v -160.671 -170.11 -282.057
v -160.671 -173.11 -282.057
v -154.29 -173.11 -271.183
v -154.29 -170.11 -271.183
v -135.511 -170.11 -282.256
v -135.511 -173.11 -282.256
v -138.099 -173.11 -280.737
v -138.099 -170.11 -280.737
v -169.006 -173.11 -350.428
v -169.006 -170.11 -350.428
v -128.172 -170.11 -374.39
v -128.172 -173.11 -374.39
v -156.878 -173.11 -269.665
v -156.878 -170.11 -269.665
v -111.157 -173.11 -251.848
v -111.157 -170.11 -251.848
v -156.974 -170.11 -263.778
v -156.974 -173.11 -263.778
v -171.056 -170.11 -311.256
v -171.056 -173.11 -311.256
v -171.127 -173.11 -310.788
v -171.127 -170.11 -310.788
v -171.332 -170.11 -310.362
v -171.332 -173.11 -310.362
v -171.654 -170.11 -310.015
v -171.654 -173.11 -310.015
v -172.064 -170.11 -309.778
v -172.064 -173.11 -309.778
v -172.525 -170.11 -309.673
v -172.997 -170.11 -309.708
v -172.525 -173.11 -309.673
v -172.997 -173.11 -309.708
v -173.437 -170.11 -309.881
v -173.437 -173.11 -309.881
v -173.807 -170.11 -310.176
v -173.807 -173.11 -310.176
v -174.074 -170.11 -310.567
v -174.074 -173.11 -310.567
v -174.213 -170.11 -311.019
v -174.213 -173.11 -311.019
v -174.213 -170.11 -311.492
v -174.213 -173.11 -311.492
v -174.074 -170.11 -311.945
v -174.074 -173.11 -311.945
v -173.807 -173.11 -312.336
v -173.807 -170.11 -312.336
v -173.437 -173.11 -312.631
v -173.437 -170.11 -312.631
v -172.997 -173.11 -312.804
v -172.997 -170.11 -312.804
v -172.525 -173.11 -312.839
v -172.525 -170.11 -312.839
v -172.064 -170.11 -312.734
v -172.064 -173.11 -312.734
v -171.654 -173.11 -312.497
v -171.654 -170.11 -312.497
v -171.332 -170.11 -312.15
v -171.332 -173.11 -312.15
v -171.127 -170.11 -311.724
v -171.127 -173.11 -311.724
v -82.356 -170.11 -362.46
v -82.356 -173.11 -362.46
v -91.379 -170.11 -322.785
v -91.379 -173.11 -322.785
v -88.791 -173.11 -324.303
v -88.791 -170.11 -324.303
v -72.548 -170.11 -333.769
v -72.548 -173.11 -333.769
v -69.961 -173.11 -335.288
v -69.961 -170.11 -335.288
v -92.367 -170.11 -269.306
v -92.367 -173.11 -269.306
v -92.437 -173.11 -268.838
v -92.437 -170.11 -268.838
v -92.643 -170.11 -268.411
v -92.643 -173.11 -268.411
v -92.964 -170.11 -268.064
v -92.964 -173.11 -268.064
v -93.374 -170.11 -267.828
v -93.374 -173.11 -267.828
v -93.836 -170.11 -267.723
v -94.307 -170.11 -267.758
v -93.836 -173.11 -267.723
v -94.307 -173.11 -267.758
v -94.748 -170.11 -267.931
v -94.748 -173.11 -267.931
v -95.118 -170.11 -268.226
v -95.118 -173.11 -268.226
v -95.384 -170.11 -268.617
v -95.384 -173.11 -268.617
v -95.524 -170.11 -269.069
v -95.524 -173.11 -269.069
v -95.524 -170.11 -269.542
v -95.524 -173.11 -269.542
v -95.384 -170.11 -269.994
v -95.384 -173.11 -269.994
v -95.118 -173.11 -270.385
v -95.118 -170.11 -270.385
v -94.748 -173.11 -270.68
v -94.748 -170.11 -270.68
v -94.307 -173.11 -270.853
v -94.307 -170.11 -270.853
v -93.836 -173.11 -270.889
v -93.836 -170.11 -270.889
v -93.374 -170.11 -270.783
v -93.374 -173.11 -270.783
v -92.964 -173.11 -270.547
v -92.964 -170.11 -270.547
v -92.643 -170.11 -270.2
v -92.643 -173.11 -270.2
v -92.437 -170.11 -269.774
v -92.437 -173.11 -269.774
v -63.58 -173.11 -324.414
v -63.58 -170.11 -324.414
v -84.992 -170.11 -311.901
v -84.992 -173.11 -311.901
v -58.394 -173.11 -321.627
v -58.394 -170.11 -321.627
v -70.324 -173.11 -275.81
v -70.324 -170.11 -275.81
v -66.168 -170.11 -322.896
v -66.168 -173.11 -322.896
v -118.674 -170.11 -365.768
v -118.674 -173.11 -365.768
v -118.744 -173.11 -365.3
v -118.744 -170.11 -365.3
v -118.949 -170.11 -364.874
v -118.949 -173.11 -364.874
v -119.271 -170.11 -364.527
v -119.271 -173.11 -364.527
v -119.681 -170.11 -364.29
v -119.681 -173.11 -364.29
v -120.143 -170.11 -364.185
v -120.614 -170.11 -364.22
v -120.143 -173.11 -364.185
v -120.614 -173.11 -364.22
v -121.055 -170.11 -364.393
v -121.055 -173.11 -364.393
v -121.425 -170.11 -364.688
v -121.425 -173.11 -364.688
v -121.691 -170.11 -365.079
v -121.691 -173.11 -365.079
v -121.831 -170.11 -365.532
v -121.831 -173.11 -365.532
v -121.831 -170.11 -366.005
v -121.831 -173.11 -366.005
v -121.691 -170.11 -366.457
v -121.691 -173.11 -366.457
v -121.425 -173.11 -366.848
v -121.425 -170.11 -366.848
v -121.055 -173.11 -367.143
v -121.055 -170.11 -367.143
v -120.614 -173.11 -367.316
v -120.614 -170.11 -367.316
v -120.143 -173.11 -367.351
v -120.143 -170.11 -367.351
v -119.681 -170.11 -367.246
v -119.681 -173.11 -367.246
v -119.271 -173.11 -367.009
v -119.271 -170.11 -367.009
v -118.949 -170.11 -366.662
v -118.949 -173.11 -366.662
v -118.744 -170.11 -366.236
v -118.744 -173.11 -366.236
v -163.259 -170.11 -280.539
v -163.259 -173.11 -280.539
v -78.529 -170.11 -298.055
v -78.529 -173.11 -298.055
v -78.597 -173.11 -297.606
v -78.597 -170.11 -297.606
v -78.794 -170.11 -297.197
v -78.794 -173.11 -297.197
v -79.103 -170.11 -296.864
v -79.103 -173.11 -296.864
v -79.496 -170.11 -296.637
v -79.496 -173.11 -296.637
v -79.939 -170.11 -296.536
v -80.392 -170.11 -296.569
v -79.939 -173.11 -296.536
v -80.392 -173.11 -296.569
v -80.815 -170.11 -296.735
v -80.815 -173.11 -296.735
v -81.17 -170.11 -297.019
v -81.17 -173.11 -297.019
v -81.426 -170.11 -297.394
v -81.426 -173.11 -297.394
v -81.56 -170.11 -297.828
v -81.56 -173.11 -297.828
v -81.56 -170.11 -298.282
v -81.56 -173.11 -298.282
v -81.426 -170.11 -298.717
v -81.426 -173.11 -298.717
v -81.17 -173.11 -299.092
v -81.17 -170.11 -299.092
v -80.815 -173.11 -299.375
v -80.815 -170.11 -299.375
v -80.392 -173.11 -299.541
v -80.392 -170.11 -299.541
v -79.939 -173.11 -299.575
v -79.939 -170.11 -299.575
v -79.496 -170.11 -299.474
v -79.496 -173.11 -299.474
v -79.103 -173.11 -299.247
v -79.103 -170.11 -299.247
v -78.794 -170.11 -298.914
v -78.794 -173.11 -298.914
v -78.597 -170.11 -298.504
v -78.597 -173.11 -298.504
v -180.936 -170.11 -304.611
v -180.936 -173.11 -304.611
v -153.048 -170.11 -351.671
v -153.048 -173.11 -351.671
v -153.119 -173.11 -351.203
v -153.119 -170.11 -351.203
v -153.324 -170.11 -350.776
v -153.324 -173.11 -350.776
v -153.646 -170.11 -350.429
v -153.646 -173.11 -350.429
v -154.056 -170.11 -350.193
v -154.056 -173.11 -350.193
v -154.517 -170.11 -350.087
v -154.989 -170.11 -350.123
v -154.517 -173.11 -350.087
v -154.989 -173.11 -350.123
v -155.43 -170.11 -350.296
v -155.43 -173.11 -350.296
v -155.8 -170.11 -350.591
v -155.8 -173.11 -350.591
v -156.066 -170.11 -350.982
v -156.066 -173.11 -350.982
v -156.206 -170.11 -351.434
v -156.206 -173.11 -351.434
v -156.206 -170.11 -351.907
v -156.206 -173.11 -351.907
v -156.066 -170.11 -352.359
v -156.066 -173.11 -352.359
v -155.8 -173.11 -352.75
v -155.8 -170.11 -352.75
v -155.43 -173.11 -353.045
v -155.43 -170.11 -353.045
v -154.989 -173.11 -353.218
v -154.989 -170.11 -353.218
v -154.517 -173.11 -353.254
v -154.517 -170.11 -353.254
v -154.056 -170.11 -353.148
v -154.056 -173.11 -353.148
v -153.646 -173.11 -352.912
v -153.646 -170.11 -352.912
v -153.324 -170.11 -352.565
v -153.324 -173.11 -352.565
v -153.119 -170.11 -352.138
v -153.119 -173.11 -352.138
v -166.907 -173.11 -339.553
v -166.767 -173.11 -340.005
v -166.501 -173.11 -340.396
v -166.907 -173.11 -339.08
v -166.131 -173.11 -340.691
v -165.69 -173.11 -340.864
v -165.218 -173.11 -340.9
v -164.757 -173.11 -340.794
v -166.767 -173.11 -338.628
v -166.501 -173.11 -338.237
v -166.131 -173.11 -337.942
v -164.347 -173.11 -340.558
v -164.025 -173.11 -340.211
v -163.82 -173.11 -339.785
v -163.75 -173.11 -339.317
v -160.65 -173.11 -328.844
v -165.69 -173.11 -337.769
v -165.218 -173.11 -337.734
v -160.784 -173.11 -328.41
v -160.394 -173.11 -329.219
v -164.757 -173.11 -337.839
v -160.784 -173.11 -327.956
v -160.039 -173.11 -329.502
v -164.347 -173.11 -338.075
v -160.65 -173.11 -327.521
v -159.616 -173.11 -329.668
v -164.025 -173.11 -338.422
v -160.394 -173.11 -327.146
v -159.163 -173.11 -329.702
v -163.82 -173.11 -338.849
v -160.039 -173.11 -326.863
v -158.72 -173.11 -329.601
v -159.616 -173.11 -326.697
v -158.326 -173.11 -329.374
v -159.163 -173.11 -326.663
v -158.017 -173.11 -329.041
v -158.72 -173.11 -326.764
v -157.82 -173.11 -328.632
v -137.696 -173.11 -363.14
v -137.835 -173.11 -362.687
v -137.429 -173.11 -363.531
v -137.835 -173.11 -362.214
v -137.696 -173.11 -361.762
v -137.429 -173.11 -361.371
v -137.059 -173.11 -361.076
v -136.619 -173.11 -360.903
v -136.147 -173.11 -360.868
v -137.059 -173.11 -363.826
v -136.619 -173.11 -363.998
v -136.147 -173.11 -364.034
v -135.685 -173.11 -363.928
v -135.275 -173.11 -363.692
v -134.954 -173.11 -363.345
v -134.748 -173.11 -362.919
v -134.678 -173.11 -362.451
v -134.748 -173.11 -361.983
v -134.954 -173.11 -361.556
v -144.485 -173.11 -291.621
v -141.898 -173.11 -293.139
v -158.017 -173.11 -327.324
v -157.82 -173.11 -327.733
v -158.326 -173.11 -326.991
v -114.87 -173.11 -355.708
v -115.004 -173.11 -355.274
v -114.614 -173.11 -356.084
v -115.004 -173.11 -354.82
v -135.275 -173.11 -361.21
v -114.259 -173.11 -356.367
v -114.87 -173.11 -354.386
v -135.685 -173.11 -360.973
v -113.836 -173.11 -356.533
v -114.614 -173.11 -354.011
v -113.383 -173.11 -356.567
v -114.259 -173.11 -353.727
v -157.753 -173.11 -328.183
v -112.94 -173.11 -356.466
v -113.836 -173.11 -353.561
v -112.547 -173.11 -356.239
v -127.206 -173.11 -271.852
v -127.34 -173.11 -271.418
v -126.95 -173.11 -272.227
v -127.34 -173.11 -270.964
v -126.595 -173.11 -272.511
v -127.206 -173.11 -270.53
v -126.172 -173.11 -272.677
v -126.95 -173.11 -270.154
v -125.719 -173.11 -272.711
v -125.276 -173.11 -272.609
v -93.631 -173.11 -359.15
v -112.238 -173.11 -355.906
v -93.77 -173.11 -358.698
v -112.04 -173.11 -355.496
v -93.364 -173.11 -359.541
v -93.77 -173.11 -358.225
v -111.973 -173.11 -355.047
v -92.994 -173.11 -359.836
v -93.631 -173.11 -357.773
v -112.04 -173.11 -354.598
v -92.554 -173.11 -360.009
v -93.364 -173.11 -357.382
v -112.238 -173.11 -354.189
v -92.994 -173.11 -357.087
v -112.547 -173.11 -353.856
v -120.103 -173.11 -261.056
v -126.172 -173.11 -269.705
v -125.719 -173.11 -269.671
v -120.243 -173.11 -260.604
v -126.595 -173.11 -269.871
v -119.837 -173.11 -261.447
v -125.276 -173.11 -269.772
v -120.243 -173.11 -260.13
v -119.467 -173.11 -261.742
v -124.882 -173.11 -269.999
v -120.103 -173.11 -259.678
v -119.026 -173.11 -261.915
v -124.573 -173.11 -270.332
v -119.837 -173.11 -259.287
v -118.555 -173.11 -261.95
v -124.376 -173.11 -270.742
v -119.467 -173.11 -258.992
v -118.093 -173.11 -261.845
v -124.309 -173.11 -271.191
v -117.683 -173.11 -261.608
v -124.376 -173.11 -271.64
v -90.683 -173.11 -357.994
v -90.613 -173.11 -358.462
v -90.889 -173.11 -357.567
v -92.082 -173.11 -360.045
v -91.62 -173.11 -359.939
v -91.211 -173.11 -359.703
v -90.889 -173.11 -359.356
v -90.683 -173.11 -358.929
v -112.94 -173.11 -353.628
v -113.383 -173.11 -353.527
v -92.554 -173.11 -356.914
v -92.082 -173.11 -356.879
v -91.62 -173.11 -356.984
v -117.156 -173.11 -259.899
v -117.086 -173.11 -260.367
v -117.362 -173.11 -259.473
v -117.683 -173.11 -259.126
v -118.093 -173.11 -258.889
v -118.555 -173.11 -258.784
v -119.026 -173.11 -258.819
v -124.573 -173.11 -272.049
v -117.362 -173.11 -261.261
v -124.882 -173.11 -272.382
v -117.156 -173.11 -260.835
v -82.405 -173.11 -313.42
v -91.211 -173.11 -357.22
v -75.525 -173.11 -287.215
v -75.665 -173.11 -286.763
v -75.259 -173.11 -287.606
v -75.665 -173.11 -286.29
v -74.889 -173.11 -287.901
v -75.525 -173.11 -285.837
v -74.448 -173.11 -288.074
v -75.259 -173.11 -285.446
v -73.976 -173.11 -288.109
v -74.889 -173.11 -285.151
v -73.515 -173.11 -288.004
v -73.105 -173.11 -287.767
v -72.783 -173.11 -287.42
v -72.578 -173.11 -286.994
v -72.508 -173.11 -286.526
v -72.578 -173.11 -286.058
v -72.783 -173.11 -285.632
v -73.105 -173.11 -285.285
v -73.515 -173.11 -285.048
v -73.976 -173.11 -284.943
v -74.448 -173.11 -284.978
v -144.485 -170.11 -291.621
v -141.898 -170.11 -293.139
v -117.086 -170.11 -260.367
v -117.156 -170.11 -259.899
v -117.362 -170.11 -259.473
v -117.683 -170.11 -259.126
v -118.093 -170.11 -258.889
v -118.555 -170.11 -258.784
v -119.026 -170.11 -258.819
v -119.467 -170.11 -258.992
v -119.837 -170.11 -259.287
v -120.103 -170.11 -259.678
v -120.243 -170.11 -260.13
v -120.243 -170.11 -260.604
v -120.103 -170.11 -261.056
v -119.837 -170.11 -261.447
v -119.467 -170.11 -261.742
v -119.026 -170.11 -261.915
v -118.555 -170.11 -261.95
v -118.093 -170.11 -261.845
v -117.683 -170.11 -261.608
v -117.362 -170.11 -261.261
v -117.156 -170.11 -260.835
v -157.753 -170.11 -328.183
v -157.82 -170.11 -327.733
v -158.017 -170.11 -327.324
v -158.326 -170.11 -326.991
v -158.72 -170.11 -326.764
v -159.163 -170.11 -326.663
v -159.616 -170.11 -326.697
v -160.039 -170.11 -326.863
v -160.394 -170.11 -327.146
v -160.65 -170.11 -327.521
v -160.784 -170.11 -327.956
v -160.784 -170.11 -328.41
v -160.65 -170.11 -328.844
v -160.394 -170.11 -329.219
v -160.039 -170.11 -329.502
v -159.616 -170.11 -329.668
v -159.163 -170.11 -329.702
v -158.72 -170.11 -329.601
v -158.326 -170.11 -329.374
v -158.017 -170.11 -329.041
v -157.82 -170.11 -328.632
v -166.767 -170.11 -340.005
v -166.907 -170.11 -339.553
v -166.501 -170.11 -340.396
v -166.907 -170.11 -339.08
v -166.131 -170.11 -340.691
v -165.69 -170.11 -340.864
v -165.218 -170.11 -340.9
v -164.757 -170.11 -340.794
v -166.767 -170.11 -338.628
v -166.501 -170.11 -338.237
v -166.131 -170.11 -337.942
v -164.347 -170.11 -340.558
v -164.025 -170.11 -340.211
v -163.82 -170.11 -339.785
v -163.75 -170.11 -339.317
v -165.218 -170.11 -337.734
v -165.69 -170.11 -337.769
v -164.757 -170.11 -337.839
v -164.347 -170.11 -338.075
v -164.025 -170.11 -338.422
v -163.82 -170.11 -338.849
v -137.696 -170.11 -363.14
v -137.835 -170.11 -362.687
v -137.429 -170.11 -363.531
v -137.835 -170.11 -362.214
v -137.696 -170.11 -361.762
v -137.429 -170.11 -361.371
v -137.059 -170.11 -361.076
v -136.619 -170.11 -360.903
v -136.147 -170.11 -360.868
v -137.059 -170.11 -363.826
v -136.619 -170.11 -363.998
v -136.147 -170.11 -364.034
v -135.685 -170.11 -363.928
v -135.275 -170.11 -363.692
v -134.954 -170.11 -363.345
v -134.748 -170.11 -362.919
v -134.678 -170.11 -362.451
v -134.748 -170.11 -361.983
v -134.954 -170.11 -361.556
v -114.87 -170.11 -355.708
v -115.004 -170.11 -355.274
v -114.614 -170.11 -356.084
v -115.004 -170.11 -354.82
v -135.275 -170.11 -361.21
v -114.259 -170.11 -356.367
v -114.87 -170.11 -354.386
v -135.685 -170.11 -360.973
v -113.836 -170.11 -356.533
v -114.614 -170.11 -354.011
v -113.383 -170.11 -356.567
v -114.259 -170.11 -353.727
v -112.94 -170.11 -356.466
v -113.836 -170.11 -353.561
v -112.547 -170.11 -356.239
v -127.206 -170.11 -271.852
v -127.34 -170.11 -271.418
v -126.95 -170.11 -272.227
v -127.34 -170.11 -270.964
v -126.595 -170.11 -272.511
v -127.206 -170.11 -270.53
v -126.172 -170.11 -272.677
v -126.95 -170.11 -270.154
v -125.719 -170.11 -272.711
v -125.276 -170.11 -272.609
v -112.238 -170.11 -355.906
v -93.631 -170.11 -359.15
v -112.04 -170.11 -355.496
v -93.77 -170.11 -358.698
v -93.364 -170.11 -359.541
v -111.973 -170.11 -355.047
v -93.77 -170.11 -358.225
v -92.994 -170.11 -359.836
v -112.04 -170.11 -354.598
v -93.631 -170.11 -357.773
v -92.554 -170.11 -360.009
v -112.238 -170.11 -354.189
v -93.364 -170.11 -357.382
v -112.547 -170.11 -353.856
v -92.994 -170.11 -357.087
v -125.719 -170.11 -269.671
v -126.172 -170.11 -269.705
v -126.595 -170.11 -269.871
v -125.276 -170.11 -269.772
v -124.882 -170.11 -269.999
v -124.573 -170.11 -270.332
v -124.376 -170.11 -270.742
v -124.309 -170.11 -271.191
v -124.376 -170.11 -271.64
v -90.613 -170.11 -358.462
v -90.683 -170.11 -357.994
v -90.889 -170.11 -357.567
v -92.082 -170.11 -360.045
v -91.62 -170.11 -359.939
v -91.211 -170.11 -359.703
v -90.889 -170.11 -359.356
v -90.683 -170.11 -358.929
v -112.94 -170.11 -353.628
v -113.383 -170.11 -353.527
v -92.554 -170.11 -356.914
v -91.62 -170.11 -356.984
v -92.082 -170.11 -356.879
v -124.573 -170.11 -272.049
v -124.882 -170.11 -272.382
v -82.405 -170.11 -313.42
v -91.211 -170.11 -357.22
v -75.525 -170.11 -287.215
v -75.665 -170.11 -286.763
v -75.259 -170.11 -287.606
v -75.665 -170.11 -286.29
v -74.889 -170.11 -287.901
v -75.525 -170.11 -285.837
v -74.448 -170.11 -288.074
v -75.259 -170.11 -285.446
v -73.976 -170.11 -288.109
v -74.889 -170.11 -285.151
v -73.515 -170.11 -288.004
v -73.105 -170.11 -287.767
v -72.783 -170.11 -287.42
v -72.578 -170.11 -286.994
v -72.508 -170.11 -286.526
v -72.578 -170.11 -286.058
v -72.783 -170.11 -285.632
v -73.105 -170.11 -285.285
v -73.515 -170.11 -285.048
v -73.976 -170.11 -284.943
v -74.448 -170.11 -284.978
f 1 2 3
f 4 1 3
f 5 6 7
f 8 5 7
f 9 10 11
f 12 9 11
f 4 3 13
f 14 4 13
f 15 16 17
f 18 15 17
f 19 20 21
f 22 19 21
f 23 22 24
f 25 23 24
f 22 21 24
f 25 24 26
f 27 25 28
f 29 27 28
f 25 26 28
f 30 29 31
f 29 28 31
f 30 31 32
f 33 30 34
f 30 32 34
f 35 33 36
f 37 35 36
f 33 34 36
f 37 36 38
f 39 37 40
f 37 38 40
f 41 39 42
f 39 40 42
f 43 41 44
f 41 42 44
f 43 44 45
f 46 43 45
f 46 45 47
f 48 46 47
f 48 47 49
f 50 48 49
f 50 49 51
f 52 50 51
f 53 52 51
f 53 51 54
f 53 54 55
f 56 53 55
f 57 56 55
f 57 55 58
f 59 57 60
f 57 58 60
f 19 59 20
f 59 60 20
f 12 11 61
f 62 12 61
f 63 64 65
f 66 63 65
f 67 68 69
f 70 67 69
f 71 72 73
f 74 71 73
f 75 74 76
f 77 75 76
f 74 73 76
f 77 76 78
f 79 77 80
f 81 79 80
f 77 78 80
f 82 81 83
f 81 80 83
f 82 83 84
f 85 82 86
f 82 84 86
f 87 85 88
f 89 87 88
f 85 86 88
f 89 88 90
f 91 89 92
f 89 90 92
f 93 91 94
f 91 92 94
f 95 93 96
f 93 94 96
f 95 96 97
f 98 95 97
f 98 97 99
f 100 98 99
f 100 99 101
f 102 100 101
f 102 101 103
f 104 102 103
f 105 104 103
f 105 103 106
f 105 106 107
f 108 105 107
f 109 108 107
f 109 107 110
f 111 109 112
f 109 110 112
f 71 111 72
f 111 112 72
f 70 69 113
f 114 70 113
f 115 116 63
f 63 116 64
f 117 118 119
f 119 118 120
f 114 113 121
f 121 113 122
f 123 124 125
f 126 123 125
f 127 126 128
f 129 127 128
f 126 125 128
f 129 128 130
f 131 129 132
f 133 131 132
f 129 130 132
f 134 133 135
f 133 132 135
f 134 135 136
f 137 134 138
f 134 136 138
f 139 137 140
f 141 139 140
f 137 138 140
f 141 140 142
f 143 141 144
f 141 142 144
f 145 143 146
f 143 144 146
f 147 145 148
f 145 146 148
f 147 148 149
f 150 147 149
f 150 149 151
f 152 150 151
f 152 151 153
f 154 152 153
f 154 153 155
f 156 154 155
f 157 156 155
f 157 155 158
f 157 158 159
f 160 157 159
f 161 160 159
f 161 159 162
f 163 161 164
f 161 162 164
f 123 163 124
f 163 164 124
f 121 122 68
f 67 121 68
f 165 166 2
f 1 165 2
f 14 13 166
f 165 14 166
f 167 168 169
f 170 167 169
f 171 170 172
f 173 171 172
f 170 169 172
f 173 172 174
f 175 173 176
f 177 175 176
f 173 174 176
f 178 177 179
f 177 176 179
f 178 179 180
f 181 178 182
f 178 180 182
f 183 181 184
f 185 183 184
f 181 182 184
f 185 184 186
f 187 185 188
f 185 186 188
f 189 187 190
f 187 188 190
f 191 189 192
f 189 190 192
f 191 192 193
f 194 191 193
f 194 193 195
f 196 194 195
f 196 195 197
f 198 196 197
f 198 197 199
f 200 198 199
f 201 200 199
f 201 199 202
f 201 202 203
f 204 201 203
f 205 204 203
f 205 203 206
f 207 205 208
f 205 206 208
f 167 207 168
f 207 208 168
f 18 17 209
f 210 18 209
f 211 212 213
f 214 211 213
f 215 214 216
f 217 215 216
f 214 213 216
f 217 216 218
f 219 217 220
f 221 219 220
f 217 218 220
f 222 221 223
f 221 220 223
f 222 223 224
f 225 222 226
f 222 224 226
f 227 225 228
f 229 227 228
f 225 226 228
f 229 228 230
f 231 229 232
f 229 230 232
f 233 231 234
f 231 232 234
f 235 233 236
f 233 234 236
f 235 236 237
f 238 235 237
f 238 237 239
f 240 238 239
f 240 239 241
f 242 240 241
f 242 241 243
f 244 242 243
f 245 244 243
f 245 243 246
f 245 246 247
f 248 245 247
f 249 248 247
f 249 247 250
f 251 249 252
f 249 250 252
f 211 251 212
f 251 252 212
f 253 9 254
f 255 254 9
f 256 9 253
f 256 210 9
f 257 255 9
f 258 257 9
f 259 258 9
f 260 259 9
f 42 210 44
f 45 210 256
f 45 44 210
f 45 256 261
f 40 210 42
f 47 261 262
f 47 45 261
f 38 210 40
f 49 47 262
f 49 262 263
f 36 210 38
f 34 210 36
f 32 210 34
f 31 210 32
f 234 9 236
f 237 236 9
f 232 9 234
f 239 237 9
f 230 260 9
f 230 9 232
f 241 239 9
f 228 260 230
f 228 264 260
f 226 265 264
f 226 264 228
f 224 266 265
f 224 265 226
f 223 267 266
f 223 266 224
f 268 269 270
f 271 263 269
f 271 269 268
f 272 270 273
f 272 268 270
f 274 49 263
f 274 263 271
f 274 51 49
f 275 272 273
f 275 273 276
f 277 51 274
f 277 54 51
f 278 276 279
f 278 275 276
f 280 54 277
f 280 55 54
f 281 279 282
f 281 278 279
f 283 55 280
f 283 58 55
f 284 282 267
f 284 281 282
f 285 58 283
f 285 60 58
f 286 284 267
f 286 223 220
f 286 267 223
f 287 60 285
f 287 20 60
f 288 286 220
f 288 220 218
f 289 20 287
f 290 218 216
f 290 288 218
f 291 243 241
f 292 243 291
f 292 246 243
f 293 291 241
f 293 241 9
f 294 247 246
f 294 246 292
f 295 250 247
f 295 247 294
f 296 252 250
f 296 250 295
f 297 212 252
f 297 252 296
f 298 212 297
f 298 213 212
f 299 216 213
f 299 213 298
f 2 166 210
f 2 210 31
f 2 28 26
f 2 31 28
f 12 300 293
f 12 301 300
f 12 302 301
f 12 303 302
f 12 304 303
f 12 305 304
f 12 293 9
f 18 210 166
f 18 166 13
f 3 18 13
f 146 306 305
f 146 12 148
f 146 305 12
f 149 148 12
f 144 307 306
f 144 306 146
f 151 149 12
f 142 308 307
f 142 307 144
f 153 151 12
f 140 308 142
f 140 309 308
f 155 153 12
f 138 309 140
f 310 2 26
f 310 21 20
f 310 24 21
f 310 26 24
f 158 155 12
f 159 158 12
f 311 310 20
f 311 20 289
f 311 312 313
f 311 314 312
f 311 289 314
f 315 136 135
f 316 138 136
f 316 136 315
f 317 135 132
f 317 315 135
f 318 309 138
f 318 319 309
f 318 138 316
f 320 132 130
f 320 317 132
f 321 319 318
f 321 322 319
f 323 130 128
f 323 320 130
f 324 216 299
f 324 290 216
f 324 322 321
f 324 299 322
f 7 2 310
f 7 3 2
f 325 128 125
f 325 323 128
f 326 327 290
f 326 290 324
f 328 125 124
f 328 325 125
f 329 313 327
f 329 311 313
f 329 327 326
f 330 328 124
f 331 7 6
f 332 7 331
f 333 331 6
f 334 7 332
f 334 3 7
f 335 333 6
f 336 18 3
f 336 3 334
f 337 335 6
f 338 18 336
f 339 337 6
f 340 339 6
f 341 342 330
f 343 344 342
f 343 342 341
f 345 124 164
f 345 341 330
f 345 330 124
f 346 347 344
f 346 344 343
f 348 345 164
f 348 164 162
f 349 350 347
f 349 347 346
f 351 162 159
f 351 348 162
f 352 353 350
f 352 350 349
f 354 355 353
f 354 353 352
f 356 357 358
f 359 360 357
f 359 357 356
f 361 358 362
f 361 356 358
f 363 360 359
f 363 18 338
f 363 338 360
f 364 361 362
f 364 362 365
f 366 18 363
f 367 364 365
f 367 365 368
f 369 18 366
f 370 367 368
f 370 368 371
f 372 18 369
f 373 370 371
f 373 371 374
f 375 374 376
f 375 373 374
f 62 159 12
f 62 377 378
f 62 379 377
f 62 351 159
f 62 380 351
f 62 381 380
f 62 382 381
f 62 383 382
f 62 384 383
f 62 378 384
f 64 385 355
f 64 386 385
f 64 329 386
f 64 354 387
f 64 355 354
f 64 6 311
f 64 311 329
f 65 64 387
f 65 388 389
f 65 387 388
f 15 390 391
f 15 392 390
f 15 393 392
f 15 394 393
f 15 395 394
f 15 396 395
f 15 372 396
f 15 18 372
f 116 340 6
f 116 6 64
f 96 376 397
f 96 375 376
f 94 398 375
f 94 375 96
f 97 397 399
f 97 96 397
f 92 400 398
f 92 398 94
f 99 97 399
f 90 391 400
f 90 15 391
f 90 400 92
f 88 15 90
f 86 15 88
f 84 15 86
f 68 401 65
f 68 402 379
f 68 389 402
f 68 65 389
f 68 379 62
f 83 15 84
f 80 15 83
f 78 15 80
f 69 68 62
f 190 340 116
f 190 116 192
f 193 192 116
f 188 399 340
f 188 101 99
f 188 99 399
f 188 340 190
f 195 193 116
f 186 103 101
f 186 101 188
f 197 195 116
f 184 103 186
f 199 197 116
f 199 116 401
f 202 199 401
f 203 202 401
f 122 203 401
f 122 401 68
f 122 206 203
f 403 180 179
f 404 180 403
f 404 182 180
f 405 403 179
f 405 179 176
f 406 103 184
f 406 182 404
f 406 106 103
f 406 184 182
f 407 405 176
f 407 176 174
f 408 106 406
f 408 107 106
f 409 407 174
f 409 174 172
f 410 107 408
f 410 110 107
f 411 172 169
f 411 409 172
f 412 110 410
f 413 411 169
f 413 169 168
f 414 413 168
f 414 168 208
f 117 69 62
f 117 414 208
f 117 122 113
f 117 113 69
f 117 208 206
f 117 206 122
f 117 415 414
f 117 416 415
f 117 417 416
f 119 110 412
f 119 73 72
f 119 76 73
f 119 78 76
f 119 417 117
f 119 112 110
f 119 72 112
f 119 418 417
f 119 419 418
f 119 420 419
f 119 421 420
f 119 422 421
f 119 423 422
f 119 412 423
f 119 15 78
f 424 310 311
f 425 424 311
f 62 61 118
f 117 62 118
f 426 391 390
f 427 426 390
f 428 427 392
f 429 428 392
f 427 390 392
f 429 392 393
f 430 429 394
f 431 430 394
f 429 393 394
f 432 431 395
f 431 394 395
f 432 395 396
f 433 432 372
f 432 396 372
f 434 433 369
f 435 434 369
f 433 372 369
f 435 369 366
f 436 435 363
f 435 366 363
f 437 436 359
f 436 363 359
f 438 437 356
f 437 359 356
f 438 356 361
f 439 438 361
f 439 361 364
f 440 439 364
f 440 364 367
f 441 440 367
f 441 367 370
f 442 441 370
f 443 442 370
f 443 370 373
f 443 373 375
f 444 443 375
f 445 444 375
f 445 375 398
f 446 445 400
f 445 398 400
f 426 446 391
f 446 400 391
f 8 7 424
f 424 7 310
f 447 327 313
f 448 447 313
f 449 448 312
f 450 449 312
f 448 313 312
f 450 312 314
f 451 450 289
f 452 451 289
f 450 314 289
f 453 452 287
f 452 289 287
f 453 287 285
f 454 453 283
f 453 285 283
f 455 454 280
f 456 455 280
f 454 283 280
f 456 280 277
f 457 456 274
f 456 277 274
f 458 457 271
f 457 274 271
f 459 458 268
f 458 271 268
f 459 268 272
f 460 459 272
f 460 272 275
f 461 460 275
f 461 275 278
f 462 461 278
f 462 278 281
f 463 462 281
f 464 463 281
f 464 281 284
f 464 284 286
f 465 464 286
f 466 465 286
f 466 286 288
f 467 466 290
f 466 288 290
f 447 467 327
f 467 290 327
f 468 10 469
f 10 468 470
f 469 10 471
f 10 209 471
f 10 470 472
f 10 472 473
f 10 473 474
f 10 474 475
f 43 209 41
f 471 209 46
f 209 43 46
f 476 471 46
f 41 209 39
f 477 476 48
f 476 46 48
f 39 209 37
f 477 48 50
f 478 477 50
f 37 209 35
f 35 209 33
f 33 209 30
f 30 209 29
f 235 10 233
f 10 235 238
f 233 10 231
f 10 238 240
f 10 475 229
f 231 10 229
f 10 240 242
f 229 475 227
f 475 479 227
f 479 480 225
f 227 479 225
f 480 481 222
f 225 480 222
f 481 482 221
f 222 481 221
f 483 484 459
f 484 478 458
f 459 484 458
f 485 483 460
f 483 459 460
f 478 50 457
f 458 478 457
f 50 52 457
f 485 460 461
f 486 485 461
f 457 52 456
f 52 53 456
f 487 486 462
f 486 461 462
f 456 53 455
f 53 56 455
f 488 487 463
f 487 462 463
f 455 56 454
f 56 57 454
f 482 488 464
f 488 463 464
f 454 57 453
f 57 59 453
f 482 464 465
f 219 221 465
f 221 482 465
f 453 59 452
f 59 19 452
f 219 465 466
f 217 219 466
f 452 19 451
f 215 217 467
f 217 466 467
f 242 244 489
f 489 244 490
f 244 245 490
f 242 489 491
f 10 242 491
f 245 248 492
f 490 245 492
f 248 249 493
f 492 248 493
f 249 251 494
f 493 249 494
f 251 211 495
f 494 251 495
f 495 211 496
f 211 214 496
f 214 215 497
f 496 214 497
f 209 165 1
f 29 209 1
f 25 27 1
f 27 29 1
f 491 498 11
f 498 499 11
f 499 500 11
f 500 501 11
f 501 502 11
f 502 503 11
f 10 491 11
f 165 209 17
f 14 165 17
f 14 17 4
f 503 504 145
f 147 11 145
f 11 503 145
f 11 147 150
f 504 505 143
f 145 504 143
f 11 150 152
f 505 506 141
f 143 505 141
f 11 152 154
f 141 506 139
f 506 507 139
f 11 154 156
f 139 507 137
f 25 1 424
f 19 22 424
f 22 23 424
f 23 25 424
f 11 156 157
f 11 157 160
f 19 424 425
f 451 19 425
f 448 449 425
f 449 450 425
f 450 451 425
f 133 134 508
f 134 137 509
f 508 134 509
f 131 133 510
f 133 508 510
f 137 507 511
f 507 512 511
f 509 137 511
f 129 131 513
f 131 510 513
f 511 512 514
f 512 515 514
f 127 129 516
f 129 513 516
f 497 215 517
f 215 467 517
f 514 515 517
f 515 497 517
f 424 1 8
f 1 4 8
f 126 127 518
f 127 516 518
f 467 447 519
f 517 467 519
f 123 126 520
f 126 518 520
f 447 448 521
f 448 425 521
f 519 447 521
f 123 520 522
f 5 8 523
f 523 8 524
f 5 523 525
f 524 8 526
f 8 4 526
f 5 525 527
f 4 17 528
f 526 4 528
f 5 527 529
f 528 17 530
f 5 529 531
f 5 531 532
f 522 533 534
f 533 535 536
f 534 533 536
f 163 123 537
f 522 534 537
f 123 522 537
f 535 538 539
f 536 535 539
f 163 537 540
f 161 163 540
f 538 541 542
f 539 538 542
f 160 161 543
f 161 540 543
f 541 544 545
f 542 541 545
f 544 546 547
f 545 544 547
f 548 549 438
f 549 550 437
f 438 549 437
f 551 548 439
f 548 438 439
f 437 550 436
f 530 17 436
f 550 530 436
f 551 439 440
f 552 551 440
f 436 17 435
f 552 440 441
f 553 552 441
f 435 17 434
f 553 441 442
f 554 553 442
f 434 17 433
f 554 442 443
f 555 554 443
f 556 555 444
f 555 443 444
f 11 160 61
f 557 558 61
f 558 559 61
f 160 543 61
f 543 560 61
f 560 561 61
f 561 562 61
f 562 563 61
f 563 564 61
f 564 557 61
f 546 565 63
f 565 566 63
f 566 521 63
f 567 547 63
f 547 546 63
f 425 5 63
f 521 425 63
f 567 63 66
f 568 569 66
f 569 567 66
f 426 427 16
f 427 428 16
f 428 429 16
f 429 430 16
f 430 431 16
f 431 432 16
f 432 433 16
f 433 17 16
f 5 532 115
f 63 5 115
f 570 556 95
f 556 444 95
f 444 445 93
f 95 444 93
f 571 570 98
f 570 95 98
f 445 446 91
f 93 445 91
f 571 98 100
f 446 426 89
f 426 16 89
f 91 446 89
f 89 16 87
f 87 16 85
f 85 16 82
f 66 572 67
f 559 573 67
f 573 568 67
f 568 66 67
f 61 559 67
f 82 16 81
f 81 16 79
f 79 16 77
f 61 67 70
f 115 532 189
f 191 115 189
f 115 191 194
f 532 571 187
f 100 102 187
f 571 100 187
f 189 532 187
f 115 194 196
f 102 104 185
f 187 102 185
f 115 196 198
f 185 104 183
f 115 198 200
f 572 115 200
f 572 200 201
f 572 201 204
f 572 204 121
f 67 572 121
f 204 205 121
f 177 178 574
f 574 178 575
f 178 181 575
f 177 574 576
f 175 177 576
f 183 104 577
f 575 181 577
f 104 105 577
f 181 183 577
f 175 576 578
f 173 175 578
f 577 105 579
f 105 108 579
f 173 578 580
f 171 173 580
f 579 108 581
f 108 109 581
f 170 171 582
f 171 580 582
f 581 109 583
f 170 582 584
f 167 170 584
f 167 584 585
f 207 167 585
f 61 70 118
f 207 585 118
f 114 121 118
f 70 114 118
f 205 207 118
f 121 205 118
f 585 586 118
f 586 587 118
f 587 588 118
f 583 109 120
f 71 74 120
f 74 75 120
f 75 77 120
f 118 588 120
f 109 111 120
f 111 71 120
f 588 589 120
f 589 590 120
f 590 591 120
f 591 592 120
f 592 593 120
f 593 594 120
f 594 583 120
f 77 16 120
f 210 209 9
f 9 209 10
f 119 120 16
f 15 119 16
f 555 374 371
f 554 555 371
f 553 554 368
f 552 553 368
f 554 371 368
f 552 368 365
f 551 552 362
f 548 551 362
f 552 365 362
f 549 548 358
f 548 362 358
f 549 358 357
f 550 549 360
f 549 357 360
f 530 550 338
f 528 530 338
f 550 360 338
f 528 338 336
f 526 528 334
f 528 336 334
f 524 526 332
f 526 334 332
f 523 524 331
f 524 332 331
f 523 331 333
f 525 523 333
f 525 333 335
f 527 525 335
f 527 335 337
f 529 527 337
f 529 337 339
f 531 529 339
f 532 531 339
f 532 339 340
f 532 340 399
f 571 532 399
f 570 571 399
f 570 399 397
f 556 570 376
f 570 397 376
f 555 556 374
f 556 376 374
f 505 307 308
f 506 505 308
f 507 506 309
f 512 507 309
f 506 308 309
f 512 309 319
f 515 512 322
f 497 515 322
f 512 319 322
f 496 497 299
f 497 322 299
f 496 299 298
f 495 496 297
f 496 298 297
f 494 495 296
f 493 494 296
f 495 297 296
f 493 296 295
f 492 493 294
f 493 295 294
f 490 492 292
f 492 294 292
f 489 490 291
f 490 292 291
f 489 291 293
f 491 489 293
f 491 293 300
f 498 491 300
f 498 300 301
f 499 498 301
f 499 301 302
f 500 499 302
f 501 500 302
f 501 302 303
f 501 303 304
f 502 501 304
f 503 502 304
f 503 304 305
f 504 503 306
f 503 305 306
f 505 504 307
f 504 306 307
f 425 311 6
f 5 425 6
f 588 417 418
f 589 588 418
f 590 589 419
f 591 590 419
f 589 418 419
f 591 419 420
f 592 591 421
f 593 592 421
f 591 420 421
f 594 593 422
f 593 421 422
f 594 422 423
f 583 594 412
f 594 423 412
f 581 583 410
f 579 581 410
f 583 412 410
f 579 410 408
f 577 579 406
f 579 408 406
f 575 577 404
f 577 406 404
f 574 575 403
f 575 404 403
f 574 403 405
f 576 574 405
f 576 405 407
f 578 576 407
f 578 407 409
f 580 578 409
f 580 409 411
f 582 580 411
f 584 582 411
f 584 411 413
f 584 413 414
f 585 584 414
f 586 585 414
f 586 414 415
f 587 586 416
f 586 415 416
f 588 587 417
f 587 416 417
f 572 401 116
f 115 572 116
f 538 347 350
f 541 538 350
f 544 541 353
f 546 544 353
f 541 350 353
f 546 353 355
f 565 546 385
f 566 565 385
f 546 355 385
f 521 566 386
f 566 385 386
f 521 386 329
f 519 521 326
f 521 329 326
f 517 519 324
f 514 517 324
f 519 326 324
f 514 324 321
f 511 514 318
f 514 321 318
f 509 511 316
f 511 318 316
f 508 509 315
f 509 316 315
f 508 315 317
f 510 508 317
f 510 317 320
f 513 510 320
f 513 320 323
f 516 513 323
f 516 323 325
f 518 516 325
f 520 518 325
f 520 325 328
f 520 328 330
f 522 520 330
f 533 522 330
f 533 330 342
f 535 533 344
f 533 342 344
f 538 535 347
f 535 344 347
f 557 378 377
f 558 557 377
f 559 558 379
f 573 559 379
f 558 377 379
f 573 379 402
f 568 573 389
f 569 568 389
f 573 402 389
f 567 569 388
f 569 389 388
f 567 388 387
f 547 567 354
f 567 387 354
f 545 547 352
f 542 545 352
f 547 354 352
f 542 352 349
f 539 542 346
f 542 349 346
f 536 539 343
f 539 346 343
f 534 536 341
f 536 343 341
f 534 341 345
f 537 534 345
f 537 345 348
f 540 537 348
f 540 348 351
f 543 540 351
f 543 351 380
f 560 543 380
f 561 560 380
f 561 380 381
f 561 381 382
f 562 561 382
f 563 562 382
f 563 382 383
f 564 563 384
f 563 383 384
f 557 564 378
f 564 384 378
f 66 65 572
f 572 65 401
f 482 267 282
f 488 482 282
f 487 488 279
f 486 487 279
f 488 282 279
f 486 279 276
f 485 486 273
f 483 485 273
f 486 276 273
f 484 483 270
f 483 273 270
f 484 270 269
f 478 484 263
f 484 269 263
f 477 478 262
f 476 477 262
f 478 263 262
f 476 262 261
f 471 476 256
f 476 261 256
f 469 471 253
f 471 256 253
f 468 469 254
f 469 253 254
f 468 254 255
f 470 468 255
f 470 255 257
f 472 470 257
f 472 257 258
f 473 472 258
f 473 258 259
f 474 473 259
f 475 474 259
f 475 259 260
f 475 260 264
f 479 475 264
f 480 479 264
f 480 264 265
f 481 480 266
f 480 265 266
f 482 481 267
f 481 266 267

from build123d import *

# Parameters (mm, degrees)
BOSS_EXTRUDE1_DEPTH = 3
SKETCH2_R           = 1.5875
SKETCH2_R_2         = 1.524
CUT_EXTRUDE1_DEPTH  = 3


with BuildPart() as part:
    # Sketch1 → Boss-Extrude1 (new body)
    with BuildSketch(Plane(origin=(-113.226454214, -170.109741769, -309.439751514), x_dir=(0.890793361, 0, -0.454408614), z_dir=(0, -1, 0))):
        Polygon((16.200077076, -64.648683729), (51.592412285, -33.201987218), (54.382400165, 14.060345359), (22.935703655, 49.452680569), (-24.326628923, 52.242668449), (-59.718964132, 20.795971938), (-62.508952012, -26.466360639), (-31.062255502, -61.858695849), align=None)
    extrude(amount=BOSS_EXTRUDE1_DEPTH)

    # Sketch2 → Cut-Extrude1 (cut)
    with BuildSketch(Plane.XZ.offset(173.109741769)):
        with Locations((-172.64368154, -311.255818085)):
            Circle(SKETCH2_R)
        with Locations((-165.337130549, -339.316642084)):
            Circle(SKETCH2_R)
        with Locations((-154.635807236, -351.670528307)):
            Circle(SKETCH2_R)
        with Locations((-159.276542973, -328.182647353)):
            Circle(SKETCH2_R_2)
        with Locations((-125.832608107, -271.190808365)):
            Circle(SKETCH2_R_2)
        with Locations((-118.673164362, -260.366927273)):
            Circle(SKETCH2_R)
        with Locations((-80.052844095, -298.055276559)):
            Circle(SKETCH2_R_2)
        with Locations((-74.095129755, -286.526196957)):
            Circle(SKETCH2_R)
        with Locations((-136.265254, -362.450731171)):
            Circle(SKETCH2_R)
        with Locations((-120.261137836, -365.768123404)):
            Circle(SKETCH2_R)
        with Locations((-113.496778962, -355.047115547)):
            Circle(SKETCH2_R_2)
        with Locations((-92.200313837, -358.461572413)):
            Circle(SKETCH2_R)
        with Locations((-93.954162759, -269.305623721)):
            Circle(SKETCH2_R)
        Polygon((-163.258580453, -280.538613217), (-160.671178566, -282.056951662), (-154.290364989, -271.183401601), (-156.877766876, -269.665063156), align=None)
        Polygon((-144.485366677, -291.620563992), (-141.897964791, -293.138902436), (-135.511480905, -282.255689599), (-138.098882792, -280.737351154), align=None)
        Polygon((-63.58013806, -324.413951361), (-66.167539946, -322.895612916), (-72.548353524, -333.769162977), (-69.960951637, -335.287501422), align=None)
        Polygon((-82.404827782, -313.419720793), (-84.992229669, -311.901382348), (-91.378713554, -322.784595186), (-88.791311667, -324.302933631), align=None)
    extrude(amount=-CUT_EXTRUDE1_DEPTH, mode=Mode.SUBTRACT)


solid = part.part
